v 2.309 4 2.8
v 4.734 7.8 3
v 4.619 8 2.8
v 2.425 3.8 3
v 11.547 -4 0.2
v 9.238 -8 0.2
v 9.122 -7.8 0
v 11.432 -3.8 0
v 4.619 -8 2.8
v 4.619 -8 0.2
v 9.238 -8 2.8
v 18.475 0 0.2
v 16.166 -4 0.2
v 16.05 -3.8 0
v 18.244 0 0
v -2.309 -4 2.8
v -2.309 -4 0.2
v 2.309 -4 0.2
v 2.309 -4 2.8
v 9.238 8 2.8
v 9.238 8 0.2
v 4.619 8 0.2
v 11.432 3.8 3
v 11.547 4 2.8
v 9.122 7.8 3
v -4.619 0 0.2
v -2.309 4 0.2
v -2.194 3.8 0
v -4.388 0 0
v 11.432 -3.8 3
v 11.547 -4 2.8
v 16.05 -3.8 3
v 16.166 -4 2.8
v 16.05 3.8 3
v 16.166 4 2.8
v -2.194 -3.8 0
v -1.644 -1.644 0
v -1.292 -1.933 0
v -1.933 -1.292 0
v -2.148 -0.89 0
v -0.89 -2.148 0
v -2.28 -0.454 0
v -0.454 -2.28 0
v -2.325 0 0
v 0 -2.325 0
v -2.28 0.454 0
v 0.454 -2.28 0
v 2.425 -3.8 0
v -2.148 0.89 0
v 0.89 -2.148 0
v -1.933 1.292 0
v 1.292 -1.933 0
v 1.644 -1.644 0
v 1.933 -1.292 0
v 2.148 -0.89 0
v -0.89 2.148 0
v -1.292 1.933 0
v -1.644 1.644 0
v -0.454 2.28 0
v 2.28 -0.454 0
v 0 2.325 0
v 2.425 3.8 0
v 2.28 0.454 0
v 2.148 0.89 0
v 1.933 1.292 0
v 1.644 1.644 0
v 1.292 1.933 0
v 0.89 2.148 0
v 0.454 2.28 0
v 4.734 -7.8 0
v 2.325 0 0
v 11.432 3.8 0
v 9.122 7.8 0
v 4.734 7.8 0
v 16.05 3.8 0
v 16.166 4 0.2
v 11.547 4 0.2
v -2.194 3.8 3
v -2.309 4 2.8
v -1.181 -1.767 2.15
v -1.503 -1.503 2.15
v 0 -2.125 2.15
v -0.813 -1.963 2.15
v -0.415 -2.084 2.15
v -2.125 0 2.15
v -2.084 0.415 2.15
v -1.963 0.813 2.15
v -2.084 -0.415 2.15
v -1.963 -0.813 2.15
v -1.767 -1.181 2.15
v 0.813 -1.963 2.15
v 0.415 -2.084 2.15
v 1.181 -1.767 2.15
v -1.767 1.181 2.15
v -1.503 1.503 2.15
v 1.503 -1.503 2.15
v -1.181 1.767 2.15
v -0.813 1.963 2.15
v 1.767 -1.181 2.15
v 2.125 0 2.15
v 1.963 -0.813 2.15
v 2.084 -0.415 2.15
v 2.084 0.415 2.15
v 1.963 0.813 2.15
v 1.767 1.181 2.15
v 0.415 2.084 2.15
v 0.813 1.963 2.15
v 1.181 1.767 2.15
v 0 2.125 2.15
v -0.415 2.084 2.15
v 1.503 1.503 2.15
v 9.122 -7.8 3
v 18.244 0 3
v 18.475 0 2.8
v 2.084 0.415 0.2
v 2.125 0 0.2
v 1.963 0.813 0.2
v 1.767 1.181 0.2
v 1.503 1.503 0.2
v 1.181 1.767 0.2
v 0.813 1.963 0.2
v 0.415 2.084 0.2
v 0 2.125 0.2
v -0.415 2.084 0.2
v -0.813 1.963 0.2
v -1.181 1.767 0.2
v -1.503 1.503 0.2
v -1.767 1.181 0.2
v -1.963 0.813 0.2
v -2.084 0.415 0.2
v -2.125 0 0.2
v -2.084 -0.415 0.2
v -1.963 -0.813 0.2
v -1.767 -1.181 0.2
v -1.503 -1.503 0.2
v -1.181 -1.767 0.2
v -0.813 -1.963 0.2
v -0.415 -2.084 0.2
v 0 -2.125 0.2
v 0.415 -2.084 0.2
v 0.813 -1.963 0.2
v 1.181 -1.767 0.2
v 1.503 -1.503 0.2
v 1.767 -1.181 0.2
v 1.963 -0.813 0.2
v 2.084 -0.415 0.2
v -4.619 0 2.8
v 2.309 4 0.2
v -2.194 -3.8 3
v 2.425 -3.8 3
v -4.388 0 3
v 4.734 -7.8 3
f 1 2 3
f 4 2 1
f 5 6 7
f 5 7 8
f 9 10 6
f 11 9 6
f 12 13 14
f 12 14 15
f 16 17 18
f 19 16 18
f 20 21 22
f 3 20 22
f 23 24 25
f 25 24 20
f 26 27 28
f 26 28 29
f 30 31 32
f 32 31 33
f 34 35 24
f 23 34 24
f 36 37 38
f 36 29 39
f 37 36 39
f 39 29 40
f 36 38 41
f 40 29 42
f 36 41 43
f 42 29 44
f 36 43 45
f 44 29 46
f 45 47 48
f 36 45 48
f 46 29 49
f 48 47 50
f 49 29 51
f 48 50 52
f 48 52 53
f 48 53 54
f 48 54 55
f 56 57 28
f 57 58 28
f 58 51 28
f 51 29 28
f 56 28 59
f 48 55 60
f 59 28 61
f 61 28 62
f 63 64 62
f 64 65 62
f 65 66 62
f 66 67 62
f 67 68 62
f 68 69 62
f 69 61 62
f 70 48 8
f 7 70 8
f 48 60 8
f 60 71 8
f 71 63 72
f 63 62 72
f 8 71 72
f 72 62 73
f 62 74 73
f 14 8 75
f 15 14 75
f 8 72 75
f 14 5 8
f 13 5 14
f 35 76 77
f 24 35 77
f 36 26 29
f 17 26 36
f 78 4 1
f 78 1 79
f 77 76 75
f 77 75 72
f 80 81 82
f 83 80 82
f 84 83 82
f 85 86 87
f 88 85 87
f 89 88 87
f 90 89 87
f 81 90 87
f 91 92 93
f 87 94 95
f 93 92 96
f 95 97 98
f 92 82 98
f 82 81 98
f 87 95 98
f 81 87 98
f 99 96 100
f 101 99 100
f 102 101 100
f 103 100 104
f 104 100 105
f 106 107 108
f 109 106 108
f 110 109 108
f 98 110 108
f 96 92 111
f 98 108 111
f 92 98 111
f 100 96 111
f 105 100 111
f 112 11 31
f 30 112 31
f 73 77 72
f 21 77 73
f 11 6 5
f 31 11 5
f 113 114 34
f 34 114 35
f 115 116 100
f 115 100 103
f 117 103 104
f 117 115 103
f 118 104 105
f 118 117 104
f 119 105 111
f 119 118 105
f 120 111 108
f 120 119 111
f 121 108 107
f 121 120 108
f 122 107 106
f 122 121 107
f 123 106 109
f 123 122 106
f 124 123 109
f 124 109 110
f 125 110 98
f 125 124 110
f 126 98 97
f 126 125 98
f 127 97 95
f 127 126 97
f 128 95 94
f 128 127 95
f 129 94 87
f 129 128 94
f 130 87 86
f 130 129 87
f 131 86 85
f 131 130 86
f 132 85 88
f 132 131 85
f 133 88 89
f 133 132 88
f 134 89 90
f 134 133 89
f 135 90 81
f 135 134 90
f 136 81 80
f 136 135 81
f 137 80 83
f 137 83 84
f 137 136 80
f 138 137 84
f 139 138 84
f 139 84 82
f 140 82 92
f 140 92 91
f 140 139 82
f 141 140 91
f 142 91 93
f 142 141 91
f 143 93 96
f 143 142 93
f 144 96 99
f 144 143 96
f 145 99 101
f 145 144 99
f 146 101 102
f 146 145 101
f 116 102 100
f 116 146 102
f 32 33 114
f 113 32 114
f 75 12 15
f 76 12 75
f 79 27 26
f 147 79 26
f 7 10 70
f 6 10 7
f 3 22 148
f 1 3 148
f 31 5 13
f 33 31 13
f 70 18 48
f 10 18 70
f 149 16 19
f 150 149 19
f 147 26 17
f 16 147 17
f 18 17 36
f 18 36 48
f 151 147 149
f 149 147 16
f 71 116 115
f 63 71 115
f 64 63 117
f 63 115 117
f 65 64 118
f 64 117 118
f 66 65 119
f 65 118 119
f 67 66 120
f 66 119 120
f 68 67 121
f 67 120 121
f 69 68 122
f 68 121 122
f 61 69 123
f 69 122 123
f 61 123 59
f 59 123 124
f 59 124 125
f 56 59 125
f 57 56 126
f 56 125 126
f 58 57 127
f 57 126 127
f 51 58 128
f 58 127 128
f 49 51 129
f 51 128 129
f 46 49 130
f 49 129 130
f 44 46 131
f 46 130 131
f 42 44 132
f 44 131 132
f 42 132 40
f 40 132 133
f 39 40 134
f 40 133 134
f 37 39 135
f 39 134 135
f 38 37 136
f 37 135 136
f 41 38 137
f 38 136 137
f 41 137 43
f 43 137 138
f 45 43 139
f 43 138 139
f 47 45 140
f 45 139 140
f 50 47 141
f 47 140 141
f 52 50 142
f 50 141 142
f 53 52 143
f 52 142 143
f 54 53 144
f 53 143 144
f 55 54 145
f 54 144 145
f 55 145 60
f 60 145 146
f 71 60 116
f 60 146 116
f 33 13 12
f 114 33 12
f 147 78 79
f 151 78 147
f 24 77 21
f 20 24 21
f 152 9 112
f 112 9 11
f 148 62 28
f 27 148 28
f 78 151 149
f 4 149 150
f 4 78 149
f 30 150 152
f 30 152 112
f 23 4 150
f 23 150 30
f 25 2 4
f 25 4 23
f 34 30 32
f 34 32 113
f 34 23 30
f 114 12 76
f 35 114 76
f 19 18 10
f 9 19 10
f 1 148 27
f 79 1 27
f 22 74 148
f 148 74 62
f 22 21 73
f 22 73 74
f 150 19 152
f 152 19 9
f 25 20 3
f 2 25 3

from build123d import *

# Parameters (mm, degrees)
PAD_DEPTH       = 3
SKETCH001_R     = 2.125
POCKET_DEPTH    = 2.15
CHAMFER_SIZE    = 0.2
CHAMFER001_SIZE = 0.2


with BuildPart() as part:
    # Sketch → Pad (new body)
    with BuildSketch(Plane.XY):
        Polygon((2.309401, 4), (-2.309401, 4), (-4.618802, 0), (-2.309401, -4), (2.309401, -4), (4.618802, -8), (9.237604, -8), (11.547005, -4), (16.165808, -4), (18.475209, 0), (16.165808, 4), (11.547005, 4), (9.237604, 8), (4.618802, 8), align=None)
    extrude(amount=PAD_DEPTH)

    # Sketch001 → Pocket (cut)
    with BuildSketch(Plane.XY):
        Circle(SKETCH001_R)
    extrude(amount=POCKET_DEPTH, mode=Mode.SUBTRACT)

    # Chamfer
    chamfer_edges = [part.edges().sort_by_distance(p)[0] for p in [
        (0, 4, 3),
        (-3.464102, 2, 3),
        (-3.464102, -2, 3),
        (0, -4, 3),
        (3.464102, -6, 3),
        (6.928203, -8, 3),
        (10.392305, -6, 3),
        (13.856406, -4, 3),
        (17.320508, -2, 3),
        (17.320508, 2, 3),
        (13.856406, 4, 3),
        (10.392305, 6, 3),
        (6.928203, 8, 3),
        (3.464102, 6, 3),
    ]]
    chamfer(chamfer_edges, length=CHAMFER_SIZE)

    # Chamfer001
    chamfer001_edges = [part.edges().sort_by_distance(p)[0] for p in [
        (0, 4, 0),
        (3.464102, 6, 0),
        (-3.464102, 2, 0),
        (6.928203, 8, 0),
        (-3.464102, -2, 0),
        (10.392305, 6, 0),
        (0, -4, 0),
        (13.856406, 4, 0),
        (3.464102, -6, 0),
        (17.320508, 2, 0),
        (6.928203, -8, 0),
        (17.320508, -2, 0),
        (10.392305, -6, 0),
        (13.856406, -4, 0),
        (-2.125, 0, 0),
    ]]
    chamfer(chamfer001_edges, length=CHAMFER001_SIZE)


solid = part.part
